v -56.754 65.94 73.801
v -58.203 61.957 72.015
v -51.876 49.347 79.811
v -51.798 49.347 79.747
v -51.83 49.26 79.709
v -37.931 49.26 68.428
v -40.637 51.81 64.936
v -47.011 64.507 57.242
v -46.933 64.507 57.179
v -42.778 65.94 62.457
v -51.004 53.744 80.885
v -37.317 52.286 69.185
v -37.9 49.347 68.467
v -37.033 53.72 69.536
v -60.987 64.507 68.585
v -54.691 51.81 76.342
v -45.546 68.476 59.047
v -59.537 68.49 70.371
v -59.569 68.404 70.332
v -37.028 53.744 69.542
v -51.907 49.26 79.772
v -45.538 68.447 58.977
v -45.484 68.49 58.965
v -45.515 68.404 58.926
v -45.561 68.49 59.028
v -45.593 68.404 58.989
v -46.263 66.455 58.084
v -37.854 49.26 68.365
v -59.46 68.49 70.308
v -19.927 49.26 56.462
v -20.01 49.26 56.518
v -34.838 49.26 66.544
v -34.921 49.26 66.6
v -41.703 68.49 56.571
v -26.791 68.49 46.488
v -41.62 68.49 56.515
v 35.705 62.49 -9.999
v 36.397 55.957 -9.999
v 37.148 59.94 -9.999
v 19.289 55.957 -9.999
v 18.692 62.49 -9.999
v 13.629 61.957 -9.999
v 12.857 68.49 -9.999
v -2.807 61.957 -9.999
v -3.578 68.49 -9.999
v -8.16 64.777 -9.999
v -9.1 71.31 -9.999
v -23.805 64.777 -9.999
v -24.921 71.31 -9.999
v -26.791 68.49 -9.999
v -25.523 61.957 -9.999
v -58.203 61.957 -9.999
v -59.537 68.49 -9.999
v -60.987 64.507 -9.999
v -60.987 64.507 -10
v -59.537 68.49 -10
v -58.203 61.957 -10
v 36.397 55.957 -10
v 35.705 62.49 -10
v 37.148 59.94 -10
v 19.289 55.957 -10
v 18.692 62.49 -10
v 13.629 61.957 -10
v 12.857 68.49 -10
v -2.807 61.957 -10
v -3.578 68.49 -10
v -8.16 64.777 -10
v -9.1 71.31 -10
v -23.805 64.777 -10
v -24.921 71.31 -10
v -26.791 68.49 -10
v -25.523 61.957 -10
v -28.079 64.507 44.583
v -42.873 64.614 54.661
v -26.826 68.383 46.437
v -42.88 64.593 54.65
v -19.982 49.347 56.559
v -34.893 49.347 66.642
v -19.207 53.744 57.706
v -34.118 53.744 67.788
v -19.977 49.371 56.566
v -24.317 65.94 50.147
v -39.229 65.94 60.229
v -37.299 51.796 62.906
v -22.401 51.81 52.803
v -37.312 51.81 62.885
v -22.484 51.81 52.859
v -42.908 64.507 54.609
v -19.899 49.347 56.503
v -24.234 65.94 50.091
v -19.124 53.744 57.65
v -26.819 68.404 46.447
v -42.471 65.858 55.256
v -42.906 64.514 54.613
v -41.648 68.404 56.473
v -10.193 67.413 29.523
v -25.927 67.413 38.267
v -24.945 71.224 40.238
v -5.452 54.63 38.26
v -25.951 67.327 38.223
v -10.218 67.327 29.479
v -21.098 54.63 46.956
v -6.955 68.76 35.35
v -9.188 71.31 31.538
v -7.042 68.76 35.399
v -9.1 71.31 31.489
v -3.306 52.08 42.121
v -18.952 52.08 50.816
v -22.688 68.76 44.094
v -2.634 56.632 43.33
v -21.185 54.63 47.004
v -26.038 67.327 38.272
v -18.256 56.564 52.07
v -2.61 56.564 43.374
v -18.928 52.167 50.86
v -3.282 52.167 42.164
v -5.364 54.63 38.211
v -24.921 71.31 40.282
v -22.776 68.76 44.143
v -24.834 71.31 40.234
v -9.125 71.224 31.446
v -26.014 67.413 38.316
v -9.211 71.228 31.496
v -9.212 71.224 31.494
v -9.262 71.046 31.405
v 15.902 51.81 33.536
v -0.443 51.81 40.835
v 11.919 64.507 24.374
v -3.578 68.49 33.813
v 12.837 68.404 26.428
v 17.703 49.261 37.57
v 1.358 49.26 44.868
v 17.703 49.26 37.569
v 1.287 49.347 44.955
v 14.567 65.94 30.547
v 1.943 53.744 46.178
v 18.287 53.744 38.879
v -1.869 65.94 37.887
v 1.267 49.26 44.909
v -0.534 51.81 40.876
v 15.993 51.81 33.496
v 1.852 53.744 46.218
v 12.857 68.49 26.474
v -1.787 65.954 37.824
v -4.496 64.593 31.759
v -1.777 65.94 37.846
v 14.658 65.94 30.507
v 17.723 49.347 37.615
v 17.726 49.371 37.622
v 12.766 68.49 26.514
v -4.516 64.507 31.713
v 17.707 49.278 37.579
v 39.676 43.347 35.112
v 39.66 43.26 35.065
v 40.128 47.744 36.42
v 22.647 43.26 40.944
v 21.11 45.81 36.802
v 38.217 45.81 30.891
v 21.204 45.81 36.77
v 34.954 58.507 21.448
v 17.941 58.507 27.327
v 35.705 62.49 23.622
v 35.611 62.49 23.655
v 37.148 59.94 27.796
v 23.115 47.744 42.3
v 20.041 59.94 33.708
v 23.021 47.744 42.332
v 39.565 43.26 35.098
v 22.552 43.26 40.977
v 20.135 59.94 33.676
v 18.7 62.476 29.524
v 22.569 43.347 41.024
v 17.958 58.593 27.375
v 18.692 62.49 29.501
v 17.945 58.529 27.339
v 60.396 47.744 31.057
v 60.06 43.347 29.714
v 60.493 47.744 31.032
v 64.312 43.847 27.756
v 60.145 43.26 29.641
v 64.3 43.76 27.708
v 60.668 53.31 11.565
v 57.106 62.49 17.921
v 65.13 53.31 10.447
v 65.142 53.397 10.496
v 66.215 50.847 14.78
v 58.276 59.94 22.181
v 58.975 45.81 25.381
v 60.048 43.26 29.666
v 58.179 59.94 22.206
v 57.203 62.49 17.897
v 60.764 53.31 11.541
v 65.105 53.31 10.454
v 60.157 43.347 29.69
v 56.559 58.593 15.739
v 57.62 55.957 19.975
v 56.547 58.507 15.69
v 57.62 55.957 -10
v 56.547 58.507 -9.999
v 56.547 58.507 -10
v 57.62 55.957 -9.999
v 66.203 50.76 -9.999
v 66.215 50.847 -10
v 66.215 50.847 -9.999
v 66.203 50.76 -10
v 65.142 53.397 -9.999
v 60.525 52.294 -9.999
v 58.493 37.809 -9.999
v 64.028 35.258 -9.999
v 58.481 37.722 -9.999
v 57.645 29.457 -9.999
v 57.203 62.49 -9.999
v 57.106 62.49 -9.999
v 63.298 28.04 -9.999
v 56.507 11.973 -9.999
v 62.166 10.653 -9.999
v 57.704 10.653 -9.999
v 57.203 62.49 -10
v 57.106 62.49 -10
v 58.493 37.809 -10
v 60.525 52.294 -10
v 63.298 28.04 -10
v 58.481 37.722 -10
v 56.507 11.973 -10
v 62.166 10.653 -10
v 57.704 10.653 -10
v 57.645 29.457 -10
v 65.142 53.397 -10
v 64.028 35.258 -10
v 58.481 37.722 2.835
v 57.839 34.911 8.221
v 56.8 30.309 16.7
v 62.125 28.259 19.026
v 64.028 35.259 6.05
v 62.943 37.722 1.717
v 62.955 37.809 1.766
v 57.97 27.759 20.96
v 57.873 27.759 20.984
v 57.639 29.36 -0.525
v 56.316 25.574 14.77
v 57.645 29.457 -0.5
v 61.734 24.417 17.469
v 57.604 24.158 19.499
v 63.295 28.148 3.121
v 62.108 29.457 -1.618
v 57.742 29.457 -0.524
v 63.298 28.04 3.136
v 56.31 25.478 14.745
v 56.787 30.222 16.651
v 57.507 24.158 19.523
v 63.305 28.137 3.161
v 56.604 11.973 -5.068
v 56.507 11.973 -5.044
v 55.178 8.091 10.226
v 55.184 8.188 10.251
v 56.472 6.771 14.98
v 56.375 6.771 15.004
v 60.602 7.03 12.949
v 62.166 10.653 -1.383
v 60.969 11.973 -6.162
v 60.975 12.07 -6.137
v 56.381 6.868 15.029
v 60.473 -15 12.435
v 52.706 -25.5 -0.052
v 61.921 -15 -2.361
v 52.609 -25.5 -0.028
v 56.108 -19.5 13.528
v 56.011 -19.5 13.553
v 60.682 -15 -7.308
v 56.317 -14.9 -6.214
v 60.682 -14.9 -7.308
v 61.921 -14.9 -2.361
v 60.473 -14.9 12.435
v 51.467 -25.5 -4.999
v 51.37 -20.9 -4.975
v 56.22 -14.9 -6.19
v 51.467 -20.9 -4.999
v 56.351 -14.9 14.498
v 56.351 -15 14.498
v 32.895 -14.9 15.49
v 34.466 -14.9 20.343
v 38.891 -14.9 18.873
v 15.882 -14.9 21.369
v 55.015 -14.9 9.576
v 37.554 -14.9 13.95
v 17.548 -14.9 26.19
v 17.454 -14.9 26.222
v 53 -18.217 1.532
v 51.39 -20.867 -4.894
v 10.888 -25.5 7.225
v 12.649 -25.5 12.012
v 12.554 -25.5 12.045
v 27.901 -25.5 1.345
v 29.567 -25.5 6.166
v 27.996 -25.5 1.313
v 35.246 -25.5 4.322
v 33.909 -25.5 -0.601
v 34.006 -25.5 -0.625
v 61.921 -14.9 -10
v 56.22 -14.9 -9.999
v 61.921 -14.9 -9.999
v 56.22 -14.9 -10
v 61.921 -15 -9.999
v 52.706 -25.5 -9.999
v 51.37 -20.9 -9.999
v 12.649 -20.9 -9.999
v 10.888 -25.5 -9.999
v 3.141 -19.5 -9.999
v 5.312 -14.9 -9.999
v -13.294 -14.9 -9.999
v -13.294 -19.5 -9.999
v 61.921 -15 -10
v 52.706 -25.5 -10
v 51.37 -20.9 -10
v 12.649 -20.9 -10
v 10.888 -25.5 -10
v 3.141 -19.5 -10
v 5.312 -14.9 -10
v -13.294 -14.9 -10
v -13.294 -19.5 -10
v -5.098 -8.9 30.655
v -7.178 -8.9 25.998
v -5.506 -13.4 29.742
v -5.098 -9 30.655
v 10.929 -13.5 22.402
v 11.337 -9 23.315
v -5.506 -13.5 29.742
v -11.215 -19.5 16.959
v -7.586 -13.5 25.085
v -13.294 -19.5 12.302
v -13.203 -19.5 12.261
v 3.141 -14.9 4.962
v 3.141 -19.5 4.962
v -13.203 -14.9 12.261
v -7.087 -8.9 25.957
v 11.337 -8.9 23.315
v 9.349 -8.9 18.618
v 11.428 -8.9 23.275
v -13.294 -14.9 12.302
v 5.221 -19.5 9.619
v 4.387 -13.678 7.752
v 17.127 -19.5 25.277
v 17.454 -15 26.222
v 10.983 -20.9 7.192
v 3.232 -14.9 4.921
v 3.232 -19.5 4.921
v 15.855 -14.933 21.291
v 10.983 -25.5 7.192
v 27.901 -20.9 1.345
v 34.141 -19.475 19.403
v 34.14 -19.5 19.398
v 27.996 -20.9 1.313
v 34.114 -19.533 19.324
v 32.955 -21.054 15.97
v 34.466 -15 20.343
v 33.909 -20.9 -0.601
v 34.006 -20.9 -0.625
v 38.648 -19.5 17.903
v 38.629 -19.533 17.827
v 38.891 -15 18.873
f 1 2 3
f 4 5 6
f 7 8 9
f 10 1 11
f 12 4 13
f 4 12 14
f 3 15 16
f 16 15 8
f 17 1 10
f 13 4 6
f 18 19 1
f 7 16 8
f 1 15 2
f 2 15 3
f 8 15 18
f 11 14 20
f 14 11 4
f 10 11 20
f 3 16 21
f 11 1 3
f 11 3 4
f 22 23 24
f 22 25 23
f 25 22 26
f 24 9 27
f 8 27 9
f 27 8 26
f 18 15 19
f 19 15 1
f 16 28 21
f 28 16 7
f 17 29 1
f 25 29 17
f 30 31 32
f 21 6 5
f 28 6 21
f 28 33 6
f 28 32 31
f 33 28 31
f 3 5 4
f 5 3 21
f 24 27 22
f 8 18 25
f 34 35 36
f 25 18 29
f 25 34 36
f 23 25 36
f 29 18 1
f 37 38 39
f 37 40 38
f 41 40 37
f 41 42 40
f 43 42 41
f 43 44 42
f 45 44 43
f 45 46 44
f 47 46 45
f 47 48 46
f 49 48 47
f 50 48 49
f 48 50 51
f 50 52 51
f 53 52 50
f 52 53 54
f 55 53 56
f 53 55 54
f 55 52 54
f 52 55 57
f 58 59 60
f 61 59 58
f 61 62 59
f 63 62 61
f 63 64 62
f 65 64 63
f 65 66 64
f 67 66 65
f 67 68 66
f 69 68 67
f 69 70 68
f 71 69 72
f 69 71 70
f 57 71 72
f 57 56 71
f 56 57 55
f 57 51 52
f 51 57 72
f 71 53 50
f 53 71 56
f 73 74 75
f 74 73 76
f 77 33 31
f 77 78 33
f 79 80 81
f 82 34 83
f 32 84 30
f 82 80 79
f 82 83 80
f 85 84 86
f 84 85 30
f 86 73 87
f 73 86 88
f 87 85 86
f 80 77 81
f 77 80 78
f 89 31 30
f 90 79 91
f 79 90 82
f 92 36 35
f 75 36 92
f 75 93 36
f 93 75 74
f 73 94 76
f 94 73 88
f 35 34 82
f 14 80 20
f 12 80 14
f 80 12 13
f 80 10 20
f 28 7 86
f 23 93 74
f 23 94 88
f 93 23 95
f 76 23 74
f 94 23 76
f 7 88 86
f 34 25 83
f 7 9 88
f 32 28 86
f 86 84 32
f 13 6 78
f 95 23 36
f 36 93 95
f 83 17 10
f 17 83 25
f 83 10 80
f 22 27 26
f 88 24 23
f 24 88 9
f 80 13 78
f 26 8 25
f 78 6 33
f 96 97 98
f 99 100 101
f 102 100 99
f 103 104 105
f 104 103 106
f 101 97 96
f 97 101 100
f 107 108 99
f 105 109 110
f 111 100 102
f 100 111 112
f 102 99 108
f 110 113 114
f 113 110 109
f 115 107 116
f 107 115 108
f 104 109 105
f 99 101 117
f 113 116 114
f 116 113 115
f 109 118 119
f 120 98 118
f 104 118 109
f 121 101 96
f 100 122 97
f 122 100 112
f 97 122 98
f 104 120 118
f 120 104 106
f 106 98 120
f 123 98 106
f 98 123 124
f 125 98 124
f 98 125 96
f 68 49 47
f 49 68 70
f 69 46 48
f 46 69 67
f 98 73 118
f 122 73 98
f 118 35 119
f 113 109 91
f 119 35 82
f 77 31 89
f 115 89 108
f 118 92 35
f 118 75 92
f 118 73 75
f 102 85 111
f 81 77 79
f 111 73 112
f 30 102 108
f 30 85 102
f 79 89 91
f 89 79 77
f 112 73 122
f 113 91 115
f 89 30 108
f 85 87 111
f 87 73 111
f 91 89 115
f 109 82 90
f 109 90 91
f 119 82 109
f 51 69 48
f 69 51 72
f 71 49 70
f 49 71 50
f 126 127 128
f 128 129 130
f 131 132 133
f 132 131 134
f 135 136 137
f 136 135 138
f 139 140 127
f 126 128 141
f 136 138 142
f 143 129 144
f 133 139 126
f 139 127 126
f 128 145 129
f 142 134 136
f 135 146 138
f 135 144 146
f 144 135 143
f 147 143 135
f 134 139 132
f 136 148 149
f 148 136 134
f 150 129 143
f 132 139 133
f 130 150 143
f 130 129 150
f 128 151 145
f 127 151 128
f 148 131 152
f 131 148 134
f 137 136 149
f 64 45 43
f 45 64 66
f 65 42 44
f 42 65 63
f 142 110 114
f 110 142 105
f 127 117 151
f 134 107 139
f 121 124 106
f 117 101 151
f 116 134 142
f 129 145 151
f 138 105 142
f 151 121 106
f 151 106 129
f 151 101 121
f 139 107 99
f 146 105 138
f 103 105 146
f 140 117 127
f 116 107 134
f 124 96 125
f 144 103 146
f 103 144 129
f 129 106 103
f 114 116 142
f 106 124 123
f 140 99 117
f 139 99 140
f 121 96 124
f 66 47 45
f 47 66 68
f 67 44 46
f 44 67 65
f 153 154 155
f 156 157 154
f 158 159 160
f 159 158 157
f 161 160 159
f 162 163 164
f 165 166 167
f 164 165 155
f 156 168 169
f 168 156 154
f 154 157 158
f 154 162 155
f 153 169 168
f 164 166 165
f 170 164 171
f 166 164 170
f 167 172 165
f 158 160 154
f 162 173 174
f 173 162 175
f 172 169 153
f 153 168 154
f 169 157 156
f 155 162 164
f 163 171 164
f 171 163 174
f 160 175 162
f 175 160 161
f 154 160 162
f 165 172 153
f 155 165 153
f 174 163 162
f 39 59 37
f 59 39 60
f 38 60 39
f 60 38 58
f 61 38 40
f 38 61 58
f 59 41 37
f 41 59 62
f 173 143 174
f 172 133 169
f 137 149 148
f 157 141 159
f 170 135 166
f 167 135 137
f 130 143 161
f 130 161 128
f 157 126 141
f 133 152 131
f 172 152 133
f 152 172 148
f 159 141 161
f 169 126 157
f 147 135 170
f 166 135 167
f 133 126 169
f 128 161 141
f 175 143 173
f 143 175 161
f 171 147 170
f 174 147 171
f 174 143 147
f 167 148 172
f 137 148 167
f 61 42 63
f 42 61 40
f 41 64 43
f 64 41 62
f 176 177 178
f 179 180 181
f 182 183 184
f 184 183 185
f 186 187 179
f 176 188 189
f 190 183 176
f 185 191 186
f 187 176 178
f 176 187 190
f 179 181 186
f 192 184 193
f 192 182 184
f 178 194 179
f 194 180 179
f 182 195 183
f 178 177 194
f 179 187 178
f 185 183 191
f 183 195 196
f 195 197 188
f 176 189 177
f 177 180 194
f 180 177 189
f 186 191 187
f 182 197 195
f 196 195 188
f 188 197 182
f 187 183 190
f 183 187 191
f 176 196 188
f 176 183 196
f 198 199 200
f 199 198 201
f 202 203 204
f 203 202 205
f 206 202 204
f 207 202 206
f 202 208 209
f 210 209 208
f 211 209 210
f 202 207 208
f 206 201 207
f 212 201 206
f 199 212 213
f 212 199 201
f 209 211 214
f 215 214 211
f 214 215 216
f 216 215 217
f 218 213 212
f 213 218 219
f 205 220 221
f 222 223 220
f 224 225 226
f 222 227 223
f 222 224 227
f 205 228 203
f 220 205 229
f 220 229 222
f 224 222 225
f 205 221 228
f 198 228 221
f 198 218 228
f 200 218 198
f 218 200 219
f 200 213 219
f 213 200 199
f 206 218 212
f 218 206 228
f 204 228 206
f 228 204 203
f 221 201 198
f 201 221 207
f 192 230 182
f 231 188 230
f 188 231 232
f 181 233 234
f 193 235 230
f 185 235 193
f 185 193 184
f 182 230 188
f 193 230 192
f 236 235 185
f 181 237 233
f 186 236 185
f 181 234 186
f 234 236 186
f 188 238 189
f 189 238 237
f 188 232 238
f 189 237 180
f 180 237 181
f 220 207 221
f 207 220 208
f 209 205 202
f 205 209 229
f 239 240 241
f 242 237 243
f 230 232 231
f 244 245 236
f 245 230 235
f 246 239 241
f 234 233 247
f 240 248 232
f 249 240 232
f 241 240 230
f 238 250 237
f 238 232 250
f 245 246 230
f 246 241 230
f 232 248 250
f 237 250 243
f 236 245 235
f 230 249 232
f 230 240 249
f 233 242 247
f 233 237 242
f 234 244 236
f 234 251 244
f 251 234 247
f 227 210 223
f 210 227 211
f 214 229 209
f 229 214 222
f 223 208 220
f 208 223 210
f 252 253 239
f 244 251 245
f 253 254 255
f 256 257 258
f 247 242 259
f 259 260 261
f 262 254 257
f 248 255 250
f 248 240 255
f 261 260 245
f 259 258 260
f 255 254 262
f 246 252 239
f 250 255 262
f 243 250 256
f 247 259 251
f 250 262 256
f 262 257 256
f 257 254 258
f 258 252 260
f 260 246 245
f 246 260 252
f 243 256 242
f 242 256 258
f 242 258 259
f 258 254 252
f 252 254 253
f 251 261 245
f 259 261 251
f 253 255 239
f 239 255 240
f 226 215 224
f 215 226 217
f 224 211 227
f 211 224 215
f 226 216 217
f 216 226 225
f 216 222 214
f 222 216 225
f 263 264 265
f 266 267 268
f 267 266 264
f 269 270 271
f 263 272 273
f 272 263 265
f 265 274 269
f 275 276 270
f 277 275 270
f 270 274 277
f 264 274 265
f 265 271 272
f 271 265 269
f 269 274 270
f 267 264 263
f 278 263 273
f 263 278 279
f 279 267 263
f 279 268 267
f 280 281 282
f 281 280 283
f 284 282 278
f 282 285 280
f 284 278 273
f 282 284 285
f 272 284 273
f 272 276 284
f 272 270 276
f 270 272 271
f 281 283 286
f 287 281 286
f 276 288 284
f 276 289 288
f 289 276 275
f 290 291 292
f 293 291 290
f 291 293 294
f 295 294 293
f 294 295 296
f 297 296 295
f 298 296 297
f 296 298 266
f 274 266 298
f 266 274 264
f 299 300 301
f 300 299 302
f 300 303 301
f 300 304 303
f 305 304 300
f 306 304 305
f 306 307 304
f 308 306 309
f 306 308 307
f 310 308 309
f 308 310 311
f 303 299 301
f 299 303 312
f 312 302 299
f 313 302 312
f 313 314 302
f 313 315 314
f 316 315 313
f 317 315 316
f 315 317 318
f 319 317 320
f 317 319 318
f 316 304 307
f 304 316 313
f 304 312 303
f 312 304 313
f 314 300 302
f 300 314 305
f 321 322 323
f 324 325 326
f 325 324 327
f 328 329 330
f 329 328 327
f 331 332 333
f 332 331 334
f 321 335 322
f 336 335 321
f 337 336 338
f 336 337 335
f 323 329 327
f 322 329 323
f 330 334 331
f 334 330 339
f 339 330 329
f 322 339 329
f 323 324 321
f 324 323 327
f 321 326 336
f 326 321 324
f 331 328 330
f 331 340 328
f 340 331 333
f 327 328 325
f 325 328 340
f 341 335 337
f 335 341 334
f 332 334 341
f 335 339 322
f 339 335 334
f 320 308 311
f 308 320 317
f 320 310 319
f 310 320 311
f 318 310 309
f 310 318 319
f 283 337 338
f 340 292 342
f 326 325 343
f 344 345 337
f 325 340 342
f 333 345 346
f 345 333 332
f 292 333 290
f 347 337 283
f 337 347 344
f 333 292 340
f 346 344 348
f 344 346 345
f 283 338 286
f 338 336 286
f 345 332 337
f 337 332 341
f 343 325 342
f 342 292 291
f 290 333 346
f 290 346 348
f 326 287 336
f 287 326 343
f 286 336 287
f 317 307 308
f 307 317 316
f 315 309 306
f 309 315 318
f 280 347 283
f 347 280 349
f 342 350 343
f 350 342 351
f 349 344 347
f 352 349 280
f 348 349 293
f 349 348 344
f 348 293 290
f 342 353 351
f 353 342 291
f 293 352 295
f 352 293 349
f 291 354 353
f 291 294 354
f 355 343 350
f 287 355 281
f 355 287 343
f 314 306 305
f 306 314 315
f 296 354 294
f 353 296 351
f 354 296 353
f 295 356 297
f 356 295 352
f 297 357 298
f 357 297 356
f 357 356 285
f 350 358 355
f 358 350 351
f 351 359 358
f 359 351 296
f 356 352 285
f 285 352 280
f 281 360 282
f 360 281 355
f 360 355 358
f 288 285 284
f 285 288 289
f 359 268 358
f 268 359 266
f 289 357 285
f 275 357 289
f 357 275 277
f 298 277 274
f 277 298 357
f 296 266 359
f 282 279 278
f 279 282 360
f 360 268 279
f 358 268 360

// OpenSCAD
// Number of non-thumb rows (some might be short because of reduced_inner_cols and reduced_outer_cols)
nrows = 3;
// Number of non-thumb columns
ncols = 6;
alpha = 0.26179916666666664;
beta = 0.08726638888888888;
// Column which is considered the middle for curvature purposes
centercol = 3;
// Row, counting from the bottom, considered the middle for curvature purposes
centerrow_offset = 1;
// Additonal left-to-right angle of keys
tenting_angle = 0.42;
// if nrows > 5, this should warn that we want standard
column_style = "orthographic"; // orthographic, fixed, standard
reduced_inner_cols = 0;
reduced_outer_cols = 0;
//thumb_offsets = [6, -3, 7];
keyboard_z_offset = 20;
extra_width = 2.5;
extra_height = 1.0;
web_thickness = 5.1;
post_size = 0.1;
post_adj = 0;
//thumb_style = "TRACKBALL_CJ";

plate_thickness = 5.1;
plate_rim = 2.0;

plate_style = "NOTCH";

sa_profile_key_height = 12.7;
sa_length = 18.5;

hole_keyswitch_height = 14.0;
hole_keyswitch_width = 14.0;
nub_keyswitch_height = 14.4;
nub_keyswitch_width = 14.4;
undercut_keyswitch_height = 14.0;
undercut_keyswitch_width = 14.0;


column_offsets = [
    [ 0, 0, 0 ],
    [ 0, 0, 0 ],
    [ 0, 2.82, -4.5 ],
    [ 0, 0, 0 ],
    [ 0, -6, 5 ],
    [ 0, -6, 5 ],
    [ 0, -6, 5 ]
];

wall_z_offset = 15;
wall_x_offset = 5;
wall_y_offset = 6;

wall_thickness = 4.5;
wall_base_y_thickness = 4.5;
wall_base_x_thickness = 4.5;
wall_base_back_thickness = 4.5;

function deg2rad(d) = d*PI/180;
function rad2deg(r) = r*180/PI;

keyswitch_height = (plate_style == "NUB" || plate_style == "HS_NUB") ? nub_keyswitch_height :
                   (plate_style == "UNDERCUT" || plate_style == "HS_UNDERCUT" || plate_style == "NOTCH" || plate_style == "HS_NOTCH") ? undercut_keyswitch_height :
                   hole_keyswitch_height;
keyswitch_width = (plate_style == "NUB" || plate_style == "HS_NUB") ? nub_keyswitch_width :
                   (plate_style == "UNDERCUT" || plate_style == "HS_UNDERCUT" || plate_style == "NOTCH" || plate_style == "HS_NOTCH") ? undercut_keyswitch_width :
                   hole_keyswitch_width;

mount_width = keyswitch_width + 2 * plate_rim;
mount_height = keyswitch_height + 2 * plate_rim;
mount_thickness = plate_thickness;

centerrow = nrows - centerrow_offset;
lastrow = nrows - 1;
cornerrow = (reduced_outer_cols>0 || reduced_inner_cols>0) ? lastrow - 1 : lastrow;
lastcol = ncols - 1;

cap_top_height = plate_thickness + sa_profile_key_height;
row_radius = ((mount_height + extra_height) / 2) / (sin(rad2deg(alpha / 2))) + cap_top_height;

column_radius = ((mount_width + extra_width) / 2) / sin(rad2deg(beta / 2)) + cap_top_height;
column_x_delta = -1 - column_radius * sin(rad2deg(beta));
column_base_angle = beta * (centercol - 2);

function translate_matrix(pos) =
    [[1, 0, 0, pos.x],
     [0, 1, 0, pos.y],
     [0, 0, 1, pos.z],
     [0, 0, 0, 1    ]];
function rotate_x_matrix(rad) =
    let(deg = rad2deg(-rad))
    [[1,         0,        0, 0],
     [0,  cos(deg), sin(deg), 0],
     [0, -sin(deg), cos(deg), 0],
     [0,         0,        0, 1]];
function rotate_y_matrix(rad) =
    let(deg = rad2deg(-rad))
    [[cos(deg), 0, -sin(deg), 0],
     [       0, 1,         0, 0],
     [sin(deg), 0,  cos(deg), 0],
     [       0, 0,         0, 1]];

function orthographic_key_placement_matrix(column, row) =
    let(
        column_angle = beta * (centercol - column),
        column_z_delta = column_radius * (1 - cos(rad2deg(column_angle)))
    )
    translate_matrix([0, 0, keyboard_z_offset]) *
    rotate_y_matrix(tenting_angle) *
    translate_matrix(column_offsets[column]) *
    translate_matrix([-(column - centercol) * column_x_delta, 0, column_z_delta]) *
    rotate_y_matrix(column_angle) *
    translate_matrix([0, 0, row_radius]) *
    rotate_x_matrix(alpha * (centerrow - row)) *
    translate_matrix([0, 0, -row_radius]);

function key_placement_matrix(column, row, column_style=column_style) =
    let (_ = assert(column_style == "orthographic", "Only orthographic is implemented."))
    orthographic_key_placement_matrix(column, row);

module key_place(column, row) {
    multmatrix(key_placement_matrix(column, row, column_style)) children();
}

module web_post() {
    translate([0, 0, plate_thickness - (web_thickness / 2)])
        cube([post_size, post_size, web_thickness]);
}

module web_post_tr() {
    translate([(mount_width / 2) - post_adj, (mount_height / 2) - post_adj, 0])
        web_post();
}

module web_post_tl() {
    translate([-(mount_width / 2) - post_adj, (mount_height / 2) - post_adj, 0])
        web_post();
}

module web_post_bl() {
    translate([-(mount_width / 2) - post_adj, -(mount_height / 2) - post_adj, 0])
        web_post();
}

module web_post_br() {
    translate([(mount_width / 2) - post_adj, -(mount_height / 2) - post_adj, 0])
        web_post();
}

module bottom_hull(height = 0.001) {
    translate([0, 0, height/2 - 10])
    linear_extrude(height=height, twist=0, convexity=0, center=true)
    projection(cut = false)
    hull()
    children();
}

module wall_brace(place1, dx1, dy1, place2, dx2, dy2, back=false) {
    function wall_locate1(dx, dy) = [dx * wall_thickness, dy * wall_thickness, -1];
    function wall_locate2(dx, dy) = [dx * wall_x_offset, dy * wall_y_offset, -wall_z_offset];
    function wall_locate3(dx, dy, back) = back ?
        [
            dx * (wall_x_offset + wall_base_x_thickness),
            dy * (wall_y_offset + wall_base_back_thickness),
            -wall_z_offset
        ] : [
            dx * (wall_x_offset + wall_base_x_thickness),
            dy * (wall_y_offset + wall_base_y_thickness),
            -wall_z_offset
        ];

    hull() {
        multmatrix(place1) children(0);
        multmatrix(place1) translate(wall_locate1(dx1, dy1)) children(0);
        multmatrix(place1) translate(wall_locate2(dx1, dy1)) children(0);
        multmatrix(place1) translate(wall_locate3(dx1, dy1, back)) children(0);
        multmatrix(place2) children(1);
        multmatrix(place2) translate(wall_locate1(dx2, dy2)) children(1);
        multmatrix(place2) translate(wall_locate2(dx2, dy2)) children(1);
        multmatrix(place2) translate(wall_locate3(dx2, dy2, back)) children(1);
    }
    bottom_hull() {
        multmatrix(place1) translate(wall_locate2(dx1, dy1)) children(0);
        multmatrix(place1) translate(wall_locate3(dx1, dy1, back)) children(0);
        multmatrix(place2) translate(wall_locate2(dx2, dy2)) children(1);
        multmatrix(place2) translate(wall_locate3(dx2, dy2, back)) children(1);
    }
}

module key_wall_brace(x1, y1, dx1, dy1, x2, y2, dx2, dy2, back=false) {
  place1 = key_placement_matrix(x1, y1);
  place2 = key_placement_matrix(x2, y2);
  wall_brace(place1, dx1, dy1, place2, dx2, dy2, back=back) {
    children(0);
    children(1);
  }
}

module back_wall() {
  x = 0;
  key_wall_brace(x, 0, 0, 1, x, 0, 0, 1, back=true) { web_post_tl(); web_post_tr(); }
  for (x = [1 : ncols - 2]) {
    key_wall_brace(x, 0, 0, 1, x, 0, 0, 1, back=true) { web_post_tl(); web_post_tr(); }
    key_wall_brace(x, 0, 0, 1, x - 1, 0, 0, 1, back=true) { web_post_tl(); web_post_tr(); }
  }
  key_wall_brace(lastcol, 0, 0, 1, lastcol, 0, 1, 0, back=true) { web_post_tr(); web_post_tr(); }
  key_wall_brace(lastcol, 0, 0, 1, lastcol, 0, 1, 0) { web_post_tr(); web_post_tr(); }
}

module right_wall() {
  y = 0;
  corner = reduced_outer_cols > 0 ? cornerrow : lastrow;
  key_wall_brace(lastcol, y, 1, 0, lastcol, y, 1, 0) { web_post_tr(); web_post_br(); }
  for (y = [1 : corner - 1]) {
    key_wall_brace(lastcol, y - 1, 1, 0, lastcol, y, 1, 0) { web_post_br(); web_post_tr(); }
    key_wall_brace(lastcol, y, 1, 0, lastcol, y, 1, 0) { web_post_tr(); web_post_br(); }
  }
  key_wall_brace(lastcol, corner, 0, -1, lastcol, corner, 1, 0) { web_post_br(); web_post_br(); }
}

module left_wall() {
  //FIXME:
}

module front_wall() {
  corner = cornerrow;
  offset_col = reduced_outer_cols > 0 ? ncols - reduced_outer_cols : 99;

  for (x = [3 : ncols - 1]) {
    if (x < (offset_col - 1)) {
      if (x > 3) {
        key_wall_brace(x-1, lastrow, 0, -1, x, lastrow, 0, -1) { web_post_br(); web_post_bl(); }
      }
      key_wall_brace(x, lastrow, 0, -1, x, lastrow, 0, -1) { web_post_bl(); web_post_br(); }
    } else if (x < offset_col) {
      if (x > 3) {
        key_wall_brace(x-1, lastrow, 0, -1, x, lastrow, 0, -1) { web_post_br(); web_post_bl(); }
      }
      key_wall_brace(x, lastrow, 0, -1, x, lastrow, 0.5, -1) { web_post_bl(); web_post_br(); }
    } else if (x == offset_col) {
      wall_bace(x - 1, lastrow, 0.5, -1, x, cornerrow, .5, -1) { web_post_br(); web_post_bl(); }
      key_wall_brace(x, cornerrow, .5, -1, x, cornerrow, 0, -1) { web_post_bl(); web_post_br(); }
    } else if (x == (offset_col + 1)) {
      key_wall_brace(x, cornerrow, 0, -1, x - 1, cornerrow, 0, -1) { web_post_bl(); web_post_br(); }
      key_wall_brace(x, cornerrow, 0, -1, x, cornerrow, 0, -1) { web_post_bl();  web_post_br(); }
    } else {
      key_wall_brace(x, cornerrow, 0, -1, x - 1, corner, 0, -1) { web_post_bl(); web_post_br(); }
      key_wall_brace(x, cornerrow, 0, -1, x, corner, 0, -1) { web_post_bl(); web_post_br(); }
    }
  }
}

module case_walls() {
    back_wall();
    left_wall();
    right_wall();
    front_wall();
}

case_walls();
